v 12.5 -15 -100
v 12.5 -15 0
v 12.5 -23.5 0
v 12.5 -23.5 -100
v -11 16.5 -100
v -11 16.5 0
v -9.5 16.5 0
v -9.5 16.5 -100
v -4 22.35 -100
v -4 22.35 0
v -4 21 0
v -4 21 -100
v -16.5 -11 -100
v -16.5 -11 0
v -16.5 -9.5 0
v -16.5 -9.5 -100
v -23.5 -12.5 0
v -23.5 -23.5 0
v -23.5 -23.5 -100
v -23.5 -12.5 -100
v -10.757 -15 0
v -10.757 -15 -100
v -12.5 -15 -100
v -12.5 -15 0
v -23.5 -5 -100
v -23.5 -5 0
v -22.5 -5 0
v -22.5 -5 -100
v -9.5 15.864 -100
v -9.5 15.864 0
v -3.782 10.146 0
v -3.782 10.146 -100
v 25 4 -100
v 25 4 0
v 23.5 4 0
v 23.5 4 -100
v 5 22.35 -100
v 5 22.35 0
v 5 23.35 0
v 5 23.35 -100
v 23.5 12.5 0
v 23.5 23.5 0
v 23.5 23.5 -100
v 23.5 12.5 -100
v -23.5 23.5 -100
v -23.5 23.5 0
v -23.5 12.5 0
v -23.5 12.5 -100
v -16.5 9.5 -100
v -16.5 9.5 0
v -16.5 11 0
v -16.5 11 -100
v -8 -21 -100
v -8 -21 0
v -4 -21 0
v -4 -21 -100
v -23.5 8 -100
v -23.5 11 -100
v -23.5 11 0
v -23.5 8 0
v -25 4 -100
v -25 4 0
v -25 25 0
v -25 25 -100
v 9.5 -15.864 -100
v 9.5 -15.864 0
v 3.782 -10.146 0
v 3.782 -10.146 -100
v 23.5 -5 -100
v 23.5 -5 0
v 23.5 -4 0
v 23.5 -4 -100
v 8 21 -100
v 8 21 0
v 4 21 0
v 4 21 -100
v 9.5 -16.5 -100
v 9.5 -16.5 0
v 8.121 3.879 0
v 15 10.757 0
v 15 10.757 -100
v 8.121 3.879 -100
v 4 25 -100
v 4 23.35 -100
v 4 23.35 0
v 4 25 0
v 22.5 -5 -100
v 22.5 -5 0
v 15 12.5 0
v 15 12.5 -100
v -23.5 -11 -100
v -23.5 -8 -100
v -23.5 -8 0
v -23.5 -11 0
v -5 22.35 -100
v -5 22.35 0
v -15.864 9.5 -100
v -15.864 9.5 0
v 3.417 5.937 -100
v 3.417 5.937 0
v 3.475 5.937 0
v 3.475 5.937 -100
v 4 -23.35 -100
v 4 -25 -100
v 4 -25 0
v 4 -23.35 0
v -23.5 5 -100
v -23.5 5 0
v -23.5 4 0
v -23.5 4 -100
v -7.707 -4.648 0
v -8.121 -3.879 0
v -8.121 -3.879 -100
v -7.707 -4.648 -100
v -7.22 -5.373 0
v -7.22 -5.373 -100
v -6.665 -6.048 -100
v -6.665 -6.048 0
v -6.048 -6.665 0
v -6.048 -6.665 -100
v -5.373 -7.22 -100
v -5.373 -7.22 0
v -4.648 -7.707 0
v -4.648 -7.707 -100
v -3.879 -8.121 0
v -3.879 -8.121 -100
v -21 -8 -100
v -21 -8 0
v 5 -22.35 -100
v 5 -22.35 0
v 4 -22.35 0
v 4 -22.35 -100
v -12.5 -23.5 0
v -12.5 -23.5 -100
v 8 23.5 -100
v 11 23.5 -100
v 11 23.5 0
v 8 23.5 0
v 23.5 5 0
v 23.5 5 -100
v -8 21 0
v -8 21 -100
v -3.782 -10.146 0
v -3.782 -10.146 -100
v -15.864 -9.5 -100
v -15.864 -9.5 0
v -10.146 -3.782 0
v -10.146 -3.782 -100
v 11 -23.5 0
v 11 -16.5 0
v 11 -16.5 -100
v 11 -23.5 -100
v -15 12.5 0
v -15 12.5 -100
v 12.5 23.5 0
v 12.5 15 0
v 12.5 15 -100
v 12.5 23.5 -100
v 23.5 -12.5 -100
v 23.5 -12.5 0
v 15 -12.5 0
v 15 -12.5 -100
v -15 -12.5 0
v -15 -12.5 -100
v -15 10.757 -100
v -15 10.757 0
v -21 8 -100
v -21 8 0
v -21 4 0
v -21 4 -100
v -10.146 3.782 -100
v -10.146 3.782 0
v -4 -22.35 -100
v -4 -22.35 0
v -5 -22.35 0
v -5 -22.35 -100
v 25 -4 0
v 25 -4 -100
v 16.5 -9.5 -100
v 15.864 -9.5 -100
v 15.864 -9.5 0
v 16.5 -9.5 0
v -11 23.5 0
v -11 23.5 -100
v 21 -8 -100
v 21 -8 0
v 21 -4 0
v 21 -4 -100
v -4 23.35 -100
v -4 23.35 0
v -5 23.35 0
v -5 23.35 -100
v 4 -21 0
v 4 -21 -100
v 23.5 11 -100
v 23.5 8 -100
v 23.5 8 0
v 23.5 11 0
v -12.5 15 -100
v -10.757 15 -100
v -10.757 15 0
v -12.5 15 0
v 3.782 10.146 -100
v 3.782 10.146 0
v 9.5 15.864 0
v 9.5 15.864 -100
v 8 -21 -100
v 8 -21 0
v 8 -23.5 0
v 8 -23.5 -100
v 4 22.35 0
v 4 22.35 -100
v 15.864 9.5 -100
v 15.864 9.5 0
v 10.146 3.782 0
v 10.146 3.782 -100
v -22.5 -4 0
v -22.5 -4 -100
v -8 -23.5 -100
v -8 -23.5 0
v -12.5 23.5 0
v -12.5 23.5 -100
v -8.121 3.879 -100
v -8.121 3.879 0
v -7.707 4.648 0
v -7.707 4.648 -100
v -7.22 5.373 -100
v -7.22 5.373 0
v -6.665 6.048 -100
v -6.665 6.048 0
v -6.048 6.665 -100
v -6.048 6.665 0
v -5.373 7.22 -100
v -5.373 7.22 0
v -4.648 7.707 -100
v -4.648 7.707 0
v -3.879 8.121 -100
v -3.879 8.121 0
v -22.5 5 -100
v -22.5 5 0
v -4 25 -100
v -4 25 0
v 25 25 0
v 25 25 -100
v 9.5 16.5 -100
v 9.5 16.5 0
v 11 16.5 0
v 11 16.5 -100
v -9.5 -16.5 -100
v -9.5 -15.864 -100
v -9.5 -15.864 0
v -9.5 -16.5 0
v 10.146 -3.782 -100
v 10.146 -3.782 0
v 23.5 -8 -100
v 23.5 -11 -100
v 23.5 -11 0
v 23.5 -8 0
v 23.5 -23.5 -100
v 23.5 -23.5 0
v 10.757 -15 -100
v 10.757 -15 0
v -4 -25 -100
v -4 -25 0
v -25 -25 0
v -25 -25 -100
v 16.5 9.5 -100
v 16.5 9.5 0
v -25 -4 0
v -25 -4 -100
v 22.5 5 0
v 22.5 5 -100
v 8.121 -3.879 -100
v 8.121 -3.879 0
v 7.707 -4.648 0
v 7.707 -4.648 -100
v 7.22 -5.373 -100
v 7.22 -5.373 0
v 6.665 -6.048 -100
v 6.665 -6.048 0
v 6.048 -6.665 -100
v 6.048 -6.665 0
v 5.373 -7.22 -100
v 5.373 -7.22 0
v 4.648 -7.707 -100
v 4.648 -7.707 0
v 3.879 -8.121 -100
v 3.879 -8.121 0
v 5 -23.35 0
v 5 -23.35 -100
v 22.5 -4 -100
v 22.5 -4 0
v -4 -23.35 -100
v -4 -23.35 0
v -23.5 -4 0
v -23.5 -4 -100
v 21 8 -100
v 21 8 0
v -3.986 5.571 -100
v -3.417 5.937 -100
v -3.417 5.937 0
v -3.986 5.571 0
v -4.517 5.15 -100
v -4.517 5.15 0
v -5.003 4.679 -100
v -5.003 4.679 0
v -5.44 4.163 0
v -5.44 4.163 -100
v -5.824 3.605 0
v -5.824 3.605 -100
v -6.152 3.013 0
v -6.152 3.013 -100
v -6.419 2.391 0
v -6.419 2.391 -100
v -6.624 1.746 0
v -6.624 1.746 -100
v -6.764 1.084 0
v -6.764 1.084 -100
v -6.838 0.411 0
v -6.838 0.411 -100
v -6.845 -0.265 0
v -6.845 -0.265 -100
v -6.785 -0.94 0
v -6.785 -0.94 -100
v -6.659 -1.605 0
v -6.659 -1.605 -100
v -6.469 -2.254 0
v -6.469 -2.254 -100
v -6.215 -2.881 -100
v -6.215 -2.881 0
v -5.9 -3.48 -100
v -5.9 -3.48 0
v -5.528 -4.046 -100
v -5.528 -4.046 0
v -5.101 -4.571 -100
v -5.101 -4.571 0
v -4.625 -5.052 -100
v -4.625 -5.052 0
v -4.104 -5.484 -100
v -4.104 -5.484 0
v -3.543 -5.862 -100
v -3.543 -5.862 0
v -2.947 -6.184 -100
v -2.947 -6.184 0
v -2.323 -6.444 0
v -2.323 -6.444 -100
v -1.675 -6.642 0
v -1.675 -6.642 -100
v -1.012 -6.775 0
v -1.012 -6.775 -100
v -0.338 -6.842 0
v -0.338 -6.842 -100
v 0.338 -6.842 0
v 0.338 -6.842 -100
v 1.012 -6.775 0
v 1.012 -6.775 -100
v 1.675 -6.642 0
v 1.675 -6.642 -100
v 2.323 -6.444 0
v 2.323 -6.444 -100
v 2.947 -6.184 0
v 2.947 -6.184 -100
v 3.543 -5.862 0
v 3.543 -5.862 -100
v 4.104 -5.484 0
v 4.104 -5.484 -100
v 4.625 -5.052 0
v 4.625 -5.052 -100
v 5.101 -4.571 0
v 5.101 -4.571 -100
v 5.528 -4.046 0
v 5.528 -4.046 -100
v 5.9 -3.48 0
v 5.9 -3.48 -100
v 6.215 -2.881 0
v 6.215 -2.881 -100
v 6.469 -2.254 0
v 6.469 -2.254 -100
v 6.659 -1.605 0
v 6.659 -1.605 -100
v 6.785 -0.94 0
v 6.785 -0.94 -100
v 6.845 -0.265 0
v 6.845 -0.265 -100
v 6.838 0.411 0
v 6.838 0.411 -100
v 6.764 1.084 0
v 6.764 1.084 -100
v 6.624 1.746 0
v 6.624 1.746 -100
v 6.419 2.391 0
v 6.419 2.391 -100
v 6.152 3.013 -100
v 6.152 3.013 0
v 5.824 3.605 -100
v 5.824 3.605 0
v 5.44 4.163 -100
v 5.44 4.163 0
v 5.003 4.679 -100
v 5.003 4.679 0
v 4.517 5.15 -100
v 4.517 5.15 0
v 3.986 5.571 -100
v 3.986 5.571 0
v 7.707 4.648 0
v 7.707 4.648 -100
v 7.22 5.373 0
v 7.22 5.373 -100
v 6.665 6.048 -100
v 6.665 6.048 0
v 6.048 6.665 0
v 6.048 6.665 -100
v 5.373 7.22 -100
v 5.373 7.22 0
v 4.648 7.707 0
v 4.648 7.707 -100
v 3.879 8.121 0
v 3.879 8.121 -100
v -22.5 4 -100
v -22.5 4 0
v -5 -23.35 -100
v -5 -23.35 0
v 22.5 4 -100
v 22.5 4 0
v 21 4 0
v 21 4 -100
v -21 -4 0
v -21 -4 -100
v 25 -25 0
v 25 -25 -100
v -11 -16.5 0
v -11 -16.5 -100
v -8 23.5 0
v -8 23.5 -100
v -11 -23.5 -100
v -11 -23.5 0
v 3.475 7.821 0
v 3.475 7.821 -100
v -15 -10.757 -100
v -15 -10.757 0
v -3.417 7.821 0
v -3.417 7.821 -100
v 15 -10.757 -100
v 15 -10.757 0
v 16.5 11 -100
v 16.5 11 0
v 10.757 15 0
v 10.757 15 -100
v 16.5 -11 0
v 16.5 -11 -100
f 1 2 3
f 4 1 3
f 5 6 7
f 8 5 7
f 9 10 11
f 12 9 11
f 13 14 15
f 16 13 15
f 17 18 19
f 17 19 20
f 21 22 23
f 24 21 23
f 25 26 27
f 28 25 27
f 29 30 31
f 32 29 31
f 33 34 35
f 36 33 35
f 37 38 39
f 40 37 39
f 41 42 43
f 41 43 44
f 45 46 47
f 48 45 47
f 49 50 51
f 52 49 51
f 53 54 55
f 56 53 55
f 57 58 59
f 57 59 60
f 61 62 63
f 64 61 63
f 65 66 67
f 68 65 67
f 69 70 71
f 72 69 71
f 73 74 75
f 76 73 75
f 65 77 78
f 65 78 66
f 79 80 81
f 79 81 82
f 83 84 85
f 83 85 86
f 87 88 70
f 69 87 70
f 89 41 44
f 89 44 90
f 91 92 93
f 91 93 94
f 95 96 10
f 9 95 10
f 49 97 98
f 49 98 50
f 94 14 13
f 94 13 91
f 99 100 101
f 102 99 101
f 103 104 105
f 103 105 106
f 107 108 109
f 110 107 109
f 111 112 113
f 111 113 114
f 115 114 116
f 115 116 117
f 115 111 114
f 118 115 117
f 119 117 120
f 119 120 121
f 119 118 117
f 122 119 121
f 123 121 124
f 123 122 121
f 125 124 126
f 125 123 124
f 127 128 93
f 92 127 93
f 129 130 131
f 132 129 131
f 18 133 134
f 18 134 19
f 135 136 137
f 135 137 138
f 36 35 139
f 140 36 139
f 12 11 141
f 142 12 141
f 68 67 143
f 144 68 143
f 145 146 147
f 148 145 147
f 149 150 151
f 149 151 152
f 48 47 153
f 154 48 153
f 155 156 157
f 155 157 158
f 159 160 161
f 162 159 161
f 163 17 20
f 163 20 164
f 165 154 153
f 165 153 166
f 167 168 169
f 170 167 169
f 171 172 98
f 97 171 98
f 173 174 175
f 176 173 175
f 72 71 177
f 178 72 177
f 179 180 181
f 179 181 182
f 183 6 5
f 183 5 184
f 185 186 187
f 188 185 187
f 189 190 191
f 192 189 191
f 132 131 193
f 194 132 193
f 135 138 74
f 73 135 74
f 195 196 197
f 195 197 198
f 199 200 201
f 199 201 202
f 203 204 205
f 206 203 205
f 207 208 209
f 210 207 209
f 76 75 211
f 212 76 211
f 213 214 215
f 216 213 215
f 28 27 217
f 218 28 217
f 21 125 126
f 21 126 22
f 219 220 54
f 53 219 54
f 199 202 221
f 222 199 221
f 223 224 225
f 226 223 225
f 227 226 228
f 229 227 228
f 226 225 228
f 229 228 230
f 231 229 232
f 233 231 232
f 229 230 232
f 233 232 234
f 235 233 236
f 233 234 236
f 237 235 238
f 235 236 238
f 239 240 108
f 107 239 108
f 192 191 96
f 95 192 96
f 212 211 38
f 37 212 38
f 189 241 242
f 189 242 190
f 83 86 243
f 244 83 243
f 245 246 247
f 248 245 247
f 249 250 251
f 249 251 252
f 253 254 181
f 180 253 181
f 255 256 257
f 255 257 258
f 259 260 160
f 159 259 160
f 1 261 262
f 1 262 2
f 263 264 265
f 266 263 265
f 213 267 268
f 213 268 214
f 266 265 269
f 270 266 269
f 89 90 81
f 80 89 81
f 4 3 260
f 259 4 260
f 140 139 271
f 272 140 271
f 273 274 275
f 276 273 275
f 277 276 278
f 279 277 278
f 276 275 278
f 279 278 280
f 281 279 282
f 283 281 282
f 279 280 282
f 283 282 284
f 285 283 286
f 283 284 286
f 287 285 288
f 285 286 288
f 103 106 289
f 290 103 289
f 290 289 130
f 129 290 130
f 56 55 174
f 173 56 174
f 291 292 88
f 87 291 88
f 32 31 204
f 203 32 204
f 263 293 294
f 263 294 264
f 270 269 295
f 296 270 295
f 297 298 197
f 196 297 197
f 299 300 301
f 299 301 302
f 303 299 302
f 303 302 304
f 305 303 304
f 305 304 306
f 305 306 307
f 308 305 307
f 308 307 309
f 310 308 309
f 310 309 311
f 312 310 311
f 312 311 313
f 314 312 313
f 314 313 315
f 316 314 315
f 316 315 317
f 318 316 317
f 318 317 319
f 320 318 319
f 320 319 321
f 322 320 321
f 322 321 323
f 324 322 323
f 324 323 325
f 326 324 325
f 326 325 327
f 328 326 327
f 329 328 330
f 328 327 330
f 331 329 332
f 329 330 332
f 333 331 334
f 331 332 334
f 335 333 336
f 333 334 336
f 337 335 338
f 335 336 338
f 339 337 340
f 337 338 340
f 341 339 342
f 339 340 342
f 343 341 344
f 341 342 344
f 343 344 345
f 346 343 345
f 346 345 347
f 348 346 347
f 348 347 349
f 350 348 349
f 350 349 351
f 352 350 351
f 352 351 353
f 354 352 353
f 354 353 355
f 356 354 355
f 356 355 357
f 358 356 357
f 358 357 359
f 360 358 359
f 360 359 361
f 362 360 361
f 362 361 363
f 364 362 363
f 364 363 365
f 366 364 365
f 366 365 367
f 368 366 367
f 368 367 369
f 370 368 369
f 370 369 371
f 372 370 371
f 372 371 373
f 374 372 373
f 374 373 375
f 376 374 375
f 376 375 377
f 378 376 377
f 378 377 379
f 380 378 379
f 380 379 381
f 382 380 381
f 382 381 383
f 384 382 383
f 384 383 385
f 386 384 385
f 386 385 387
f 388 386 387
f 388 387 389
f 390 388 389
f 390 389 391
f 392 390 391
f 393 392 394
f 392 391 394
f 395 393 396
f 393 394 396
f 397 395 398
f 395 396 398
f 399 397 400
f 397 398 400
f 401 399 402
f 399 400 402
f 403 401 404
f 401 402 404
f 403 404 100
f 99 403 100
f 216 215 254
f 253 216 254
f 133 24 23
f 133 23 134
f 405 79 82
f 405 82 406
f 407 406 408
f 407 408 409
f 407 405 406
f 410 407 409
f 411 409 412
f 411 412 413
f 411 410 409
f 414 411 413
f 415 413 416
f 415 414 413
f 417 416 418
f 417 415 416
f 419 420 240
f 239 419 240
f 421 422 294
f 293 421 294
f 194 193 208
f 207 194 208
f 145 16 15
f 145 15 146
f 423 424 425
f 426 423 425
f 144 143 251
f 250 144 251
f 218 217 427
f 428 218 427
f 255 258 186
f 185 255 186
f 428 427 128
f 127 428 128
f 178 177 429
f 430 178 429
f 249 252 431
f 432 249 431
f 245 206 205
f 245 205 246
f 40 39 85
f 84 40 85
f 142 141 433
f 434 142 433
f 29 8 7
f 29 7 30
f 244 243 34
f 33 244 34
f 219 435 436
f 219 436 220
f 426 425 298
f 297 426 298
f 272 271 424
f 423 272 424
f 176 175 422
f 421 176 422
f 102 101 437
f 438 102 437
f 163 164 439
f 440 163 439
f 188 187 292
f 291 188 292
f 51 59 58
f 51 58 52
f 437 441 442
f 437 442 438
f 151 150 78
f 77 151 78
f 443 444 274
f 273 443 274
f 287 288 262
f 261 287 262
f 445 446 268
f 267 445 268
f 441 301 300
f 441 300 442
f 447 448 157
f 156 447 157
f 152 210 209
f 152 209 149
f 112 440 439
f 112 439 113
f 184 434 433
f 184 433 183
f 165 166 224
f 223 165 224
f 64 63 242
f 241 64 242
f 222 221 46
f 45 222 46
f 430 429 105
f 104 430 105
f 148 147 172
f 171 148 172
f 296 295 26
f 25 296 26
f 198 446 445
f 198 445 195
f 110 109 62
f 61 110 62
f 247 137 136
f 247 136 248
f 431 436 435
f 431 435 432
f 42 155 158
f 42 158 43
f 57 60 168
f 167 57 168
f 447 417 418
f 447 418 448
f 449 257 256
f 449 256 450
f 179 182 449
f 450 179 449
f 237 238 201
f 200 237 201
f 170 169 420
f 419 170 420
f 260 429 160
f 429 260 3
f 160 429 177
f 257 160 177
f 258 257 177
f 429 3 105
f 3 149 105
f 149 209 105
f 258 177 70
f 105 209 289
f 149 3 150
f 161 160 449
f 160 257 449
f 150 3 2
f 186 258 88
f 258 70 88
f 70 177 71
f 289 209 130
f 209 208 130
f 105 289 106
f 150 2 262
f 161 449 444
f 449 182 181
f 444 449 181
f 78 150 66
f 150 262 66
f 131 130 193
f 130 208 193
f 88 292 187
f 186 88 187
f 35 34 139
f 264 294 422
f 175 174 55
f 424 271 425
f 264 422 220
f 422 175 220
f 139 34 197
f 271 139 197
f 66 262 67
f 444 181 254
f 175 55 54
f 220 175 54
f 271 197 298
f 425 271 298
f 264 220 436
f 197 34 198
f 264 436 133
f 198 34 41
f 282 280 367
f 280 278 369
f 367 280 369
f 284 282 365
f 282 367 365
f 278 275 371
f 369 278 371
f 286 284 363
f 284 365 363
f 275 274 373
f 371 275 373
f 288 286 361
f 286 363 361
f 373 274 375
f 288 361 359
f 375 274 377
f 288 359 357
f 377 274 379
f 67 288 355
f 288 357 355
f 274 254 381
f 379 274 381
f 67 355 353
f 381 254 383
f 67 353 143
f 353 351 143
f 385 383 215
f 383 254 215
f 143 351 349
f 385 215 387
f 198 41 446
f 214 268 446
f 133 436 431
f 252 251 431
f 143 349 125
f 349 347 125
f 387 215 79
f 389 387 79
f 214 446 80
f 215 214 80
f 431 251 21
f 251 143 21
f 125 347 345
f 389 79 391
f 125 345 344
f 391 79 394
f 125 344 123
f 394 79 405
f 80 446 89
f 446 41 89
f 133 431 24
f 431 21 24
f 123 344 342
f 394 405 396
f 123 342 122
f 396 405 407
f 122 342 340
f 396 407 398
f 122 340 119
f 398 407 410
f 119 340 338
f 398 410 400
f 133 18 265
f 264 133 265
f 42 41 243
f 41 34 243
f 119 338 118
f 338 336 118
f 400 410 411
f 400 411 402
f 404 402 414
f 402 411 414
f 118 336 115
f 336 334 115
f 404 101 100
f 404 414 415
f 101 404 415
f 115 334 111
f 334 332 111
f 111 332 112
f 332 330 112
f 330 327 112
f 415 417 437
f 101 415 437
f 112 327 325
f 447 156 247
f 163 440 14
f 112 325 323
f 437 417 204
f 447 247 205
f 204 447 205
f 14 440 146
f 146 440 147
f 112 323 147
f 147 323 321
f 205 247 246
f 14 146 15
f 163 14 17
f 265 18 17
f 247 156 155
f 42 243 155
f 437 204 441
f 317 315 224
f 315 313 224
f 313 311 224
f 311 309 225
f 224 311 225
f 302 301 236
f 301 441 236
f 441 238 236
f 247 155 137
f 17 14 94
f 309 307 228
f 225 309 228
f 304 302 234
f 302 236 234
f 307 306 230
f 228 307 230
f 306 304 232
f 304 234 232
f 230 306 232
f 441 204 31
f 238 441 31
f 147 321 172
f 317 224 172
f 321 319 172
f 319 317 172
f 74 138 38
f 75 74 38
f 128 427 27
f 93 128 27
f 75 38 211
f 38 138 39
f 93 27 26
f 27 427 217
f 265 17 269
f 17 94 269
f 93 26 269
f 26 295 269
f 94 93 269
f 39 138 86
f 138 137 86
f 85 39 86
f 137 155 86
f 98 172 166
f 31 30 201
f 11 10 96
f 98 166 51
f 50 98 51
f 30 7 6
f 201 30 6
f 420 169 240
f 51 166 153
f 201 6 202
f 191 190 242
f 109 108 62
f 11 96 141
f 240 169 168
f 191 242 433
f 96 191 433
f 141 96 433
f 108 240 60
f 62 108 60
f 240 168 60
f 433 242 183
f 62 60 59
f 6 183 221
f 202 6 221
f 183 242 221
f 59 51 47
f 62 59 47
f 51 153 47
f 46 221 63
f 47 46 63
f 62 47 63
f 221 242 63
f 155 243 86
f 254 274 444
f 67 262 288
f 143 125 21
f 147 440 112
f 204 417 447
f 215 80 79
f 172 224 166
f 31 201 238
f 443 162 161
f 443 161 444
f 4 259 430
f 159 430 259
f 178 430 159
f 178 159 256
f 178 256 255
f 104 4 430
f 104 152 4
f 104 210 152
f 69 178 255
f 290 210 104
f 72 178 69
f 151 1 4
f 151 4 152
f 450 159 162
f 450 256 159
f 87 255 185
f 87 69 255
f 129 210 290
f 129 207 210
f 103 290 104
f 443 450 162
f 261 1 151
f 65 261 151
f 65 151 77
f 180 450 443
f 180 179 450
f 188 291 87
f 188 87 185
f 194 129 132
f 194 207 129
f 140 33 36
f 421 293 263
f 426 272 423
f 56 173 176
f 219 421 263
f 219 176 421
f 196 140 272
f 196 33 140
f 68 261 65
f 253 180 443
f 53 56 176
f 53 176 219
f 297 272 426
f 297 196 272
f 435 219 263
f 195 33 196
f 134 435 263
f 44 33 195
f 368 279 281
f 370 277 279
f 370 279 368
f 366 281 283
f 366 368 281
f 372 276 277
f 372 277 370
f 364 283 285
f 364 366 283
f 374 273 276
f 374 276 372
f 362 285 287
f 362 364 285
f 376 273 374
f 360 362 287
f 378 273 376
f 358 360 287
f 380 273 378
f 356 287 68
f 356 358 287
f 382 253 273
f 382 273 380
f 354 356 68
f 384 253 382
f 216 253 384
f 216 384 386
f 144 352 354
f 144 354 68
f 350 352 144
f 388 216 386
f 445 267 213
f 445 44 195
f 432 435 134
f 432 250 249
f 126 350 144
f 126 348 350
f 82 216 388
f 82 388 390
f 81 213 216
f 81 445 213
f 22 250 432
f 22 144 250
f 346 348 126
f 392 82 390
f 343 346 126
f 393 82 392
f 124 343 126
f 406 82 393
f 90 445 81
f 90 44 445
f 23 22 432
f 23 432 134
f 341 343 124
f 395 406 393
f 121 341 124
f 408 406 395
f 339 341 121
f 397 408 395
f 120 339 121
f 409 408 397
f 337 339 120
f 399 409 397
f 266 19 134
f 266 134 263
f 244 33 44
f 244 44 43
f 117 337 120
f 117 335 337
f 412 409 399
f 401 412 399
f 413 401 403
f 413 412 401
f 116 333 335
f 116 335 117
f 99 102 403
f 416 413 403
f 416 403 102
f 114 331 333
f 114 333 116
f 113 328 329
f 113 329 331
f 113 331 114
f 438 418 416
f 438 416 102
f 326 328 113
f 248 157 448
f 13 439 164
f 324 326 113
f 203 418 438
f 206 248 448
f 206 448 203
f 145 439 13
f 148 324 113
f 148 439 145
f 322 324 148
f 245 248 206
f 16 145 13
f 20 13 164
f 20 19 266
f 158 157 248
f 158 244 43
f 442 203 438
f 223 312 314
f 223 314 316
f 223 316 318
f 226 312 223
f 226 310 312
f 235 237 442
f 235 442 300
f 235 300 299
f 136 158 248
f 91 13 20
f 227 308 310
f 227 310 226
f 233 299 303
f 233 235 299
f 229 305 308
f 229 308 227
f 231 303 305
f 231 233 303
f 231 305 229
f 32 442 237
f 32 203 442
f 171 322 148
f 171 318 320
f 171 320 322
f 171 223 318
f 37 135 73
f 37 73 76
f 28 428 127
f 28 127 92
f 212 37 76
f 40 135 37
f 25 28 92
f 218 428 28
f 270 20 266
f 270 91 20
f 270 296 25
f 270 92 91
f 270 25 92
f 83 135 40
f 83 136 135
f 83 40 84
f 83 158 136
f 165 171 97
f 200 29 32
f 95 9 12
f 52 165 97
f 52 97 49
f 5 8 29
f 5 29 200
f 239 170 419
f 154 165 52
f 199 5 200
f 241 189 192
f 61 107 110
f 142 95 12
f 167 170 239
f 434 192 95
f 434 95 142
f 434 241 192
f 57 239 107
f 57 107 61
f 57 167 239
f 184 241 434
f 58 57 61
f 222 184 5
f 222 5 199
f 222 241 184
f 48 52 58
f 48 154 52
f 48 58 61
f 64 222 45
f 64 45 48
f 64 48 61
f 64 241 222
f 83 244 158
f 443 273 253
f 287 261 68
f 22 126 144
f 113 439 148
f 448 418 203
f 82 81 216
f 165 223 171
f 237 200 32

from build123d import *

# Parameters (mm, degrees)
SKETCH_A01_1_R     = 6.85
EXTRUDE1_DEPTH     = 100
SKETCH1_W          = 6.892084618
SKETCH1_H          = 1.884433334
CUT_EXTRUDE1_DEPTH = 101


with BuildPart() as part:
    # Sketch A01-1 → Extrude1 (new body)
    with BuildSketch(Plane.XY):
        Polygon((-23.5, 4), (-25, 4), (-25, 25), (-4, 25), (-4, 23.349803168), (-5, 23.349803168), (-5, 22.349803168), (-4, 22.349803168), (-4, 21), (-8, 21), (-8, 23.5), (-11, 23.5), (-11, 21), (-11, 16.5), (-9.5, 16.5), (-9.5, 15.863961), (-3.78206785, 10.14602885), (3.78206785, 10.14602885), (9.5, 15.863961), (9.5, 16.5), (11, 16.5), (11, 21), (11, 23.5), (8, 23.5), (8, 21), (4, 21), (4, 22.349803168), (5, 22.349803168), (5, 23.349803168), (4, 23.349803168), (4, 25), (25, 25), (25, 4), (23.5, 4), (23.5, 5), (22.5, 5), (22.5, 4), (21, 4), (21, 8), (23.5, 8), (23.5, 11), (21, 11), (16.5, 11), (16.5, 9.5), (15.863961, 9.5), (10.14602885, 3.78206785), (10.14602885, -3.78206785), (15.863961, -9.5), (16.5, -9.5), (16.5, -11), (21, -11), (23.5, -11), (23.5, -8), (21, -8), (21, -4), (22.5, -4), (22.5, -5), (23.5, -5), (23.5, -4), (25, -4), (25, -25), (4, -25), (4, -23.349803168), (5, -23.349803168), (5, -22.349803168), (4, -22.349803168), (4, -21), (8, -21), (8, -23.5), (11, -23.5), (11, -21), (11, -16.5), (9.5, -16.5), (9.5, -15.863961), (3.78206785, -10.14602885), (-3.78206785, -10.14602885), (-9.5, -15.863961), (-9.5, -16.5), (-11, -16.5), (-11, -21), (-11, -23.5), (-8, -23.5), (-8, -21), (-4, -21), (-4, -22.349803168), (-5, -22.349803168), (-5, -23.349803168), (-4, -23.349803168), (-4, -25), (-25, -25), (-25, -4), (-23.5, -4), (-23.5, -5), (-22.5, -5), (-22.5, -4), (-21, -4), (-21, -8), (-23.5, -8), (-23.5, -11), (-21, -11), (-16.5, -11), (-16.5, -9.5), (-15.863961, -9.5), (-10.14602885, -3.78206785), (-10.14602885, 3.78206785), (-15.863961, 9.5), (-16.5, 9.5), (-16.5, 11), (-21, 11), (-23.5, 11), (-23.5, 8), (-21, 8), (-21, 4), (-22.5, 4), (-22.5, 5), (-23.5, 5), align=None)
        Circle(SKETCH_A01_1_R, mode=Mode.SUBTRACT)
        with BuildLine():
            Line((-23.5, 23.5), (-23.5, 12.5))
            Line((-23.5, 12.5), (-15, 12.5))
            Line((-15, 12.5), (-15, 10.757359344))
            Line((-15, 10.757359344), (-8.121320334, 3.878679677))
            ThreePointArc((-8.121320334, 3.878679677), (-6.363961031, 6.363961031), (-3.878679677, 8.121320334))
            Line((-3.878679677, 8.121320334), (-10.757359344, 15))
            Line((-10.757359344, 15), (-12.5, 15))
            Line((-12.5, 15), (-12.5, 23.5))
            Line((-12.5, 23.5), (-23.5, 23.5))
        make_face(mode=Mode.SUBTRACT)
        with BuildLine():
            Line((10.757359344, 15), (12.5, 15))
            Line((12.5, 15), (12.5, 23.5))
            Line((12.5, 23.5), (23.5, 23.5))
            Line((23.5, 23.5), (23.5, 12.5))
            Line((23.5, 12.5), (15, 12.5))
            Line((15, 12.5), (15, 10.757359344))
            Line((15, 10.757359344), (8.121320334, 3.878679677))
            ThreePointArc((8.121320334, 3.878679677), (6.363961031, 6.363961031), (3.878679677, 8.121320334))
            Line((3.878679677, 8.121320334), (10.757359344, 15))
        make_face(mode=Mode.SUBTRACT)
        with BuildLine():
            Line((23.5, -23.5), (23.5, -12.5))
            Line((23.5, -12.5), (15, -12.5))
            Line((15, -12.5), (15, -10.757359344))
            Line((15, -10.757359344), (8.121320334, -3.878679677))
            ThreePointArc((8.121320334, -3.878679677), (6.363961031, -6.363961031), (3.878679677, -8.121320334))
            Line((3.878679677, -8.121320334), (10.757359344, -15))
            Line((10.757359344, -15), (12.5, -15))
            Line((12.5, -15), (12.5, -23.5))
            Line((12.5, -23.5), (23.5, -23.5))
        make_face(mode=Mode.SUBTRACT)
        with BuildLine():
            Line((-10.757359344, -15), (-12.5, -15))
            Line((-12.5, -15), (-12.5, -23.5))
            Line((-12.5, -23.5), (-23.5, -23.5))
            Line((-23.5, -23.5), (-23.5, -12.5))
            Line((-23.5, -12.5), (-15, -12.5))
            Line((-15, -12.5), (-15, -10.757359344))
            Line((-15, -10.757359344), (-8.121320334, -3.878679677))
            ThreePointArc((-8.121320334, -3.878679677), (-6.363961031, -6.363961031), (-3.878679677, -8.121320334))
            Line((-3.878679677, -8.121320334), (-10.757359344, -15))
        make_face(mode=Mode.SUBTRACT)
    extrude(amount=-EXTRUDE1_DEPTH)

    # Sketch1 → Cut-Extrude1 (cut, through all)
    with BuildSketch(Plane.XY):
        with Locations((0.028776834, 6.878949495)):
            Rectangle(SKETCH1_W, SKETCH1_H)
    extrude(amount=-CUT_EXTRUDE1_DEPTH, mode=Mode.SUBTRACT)


solid = part.part
